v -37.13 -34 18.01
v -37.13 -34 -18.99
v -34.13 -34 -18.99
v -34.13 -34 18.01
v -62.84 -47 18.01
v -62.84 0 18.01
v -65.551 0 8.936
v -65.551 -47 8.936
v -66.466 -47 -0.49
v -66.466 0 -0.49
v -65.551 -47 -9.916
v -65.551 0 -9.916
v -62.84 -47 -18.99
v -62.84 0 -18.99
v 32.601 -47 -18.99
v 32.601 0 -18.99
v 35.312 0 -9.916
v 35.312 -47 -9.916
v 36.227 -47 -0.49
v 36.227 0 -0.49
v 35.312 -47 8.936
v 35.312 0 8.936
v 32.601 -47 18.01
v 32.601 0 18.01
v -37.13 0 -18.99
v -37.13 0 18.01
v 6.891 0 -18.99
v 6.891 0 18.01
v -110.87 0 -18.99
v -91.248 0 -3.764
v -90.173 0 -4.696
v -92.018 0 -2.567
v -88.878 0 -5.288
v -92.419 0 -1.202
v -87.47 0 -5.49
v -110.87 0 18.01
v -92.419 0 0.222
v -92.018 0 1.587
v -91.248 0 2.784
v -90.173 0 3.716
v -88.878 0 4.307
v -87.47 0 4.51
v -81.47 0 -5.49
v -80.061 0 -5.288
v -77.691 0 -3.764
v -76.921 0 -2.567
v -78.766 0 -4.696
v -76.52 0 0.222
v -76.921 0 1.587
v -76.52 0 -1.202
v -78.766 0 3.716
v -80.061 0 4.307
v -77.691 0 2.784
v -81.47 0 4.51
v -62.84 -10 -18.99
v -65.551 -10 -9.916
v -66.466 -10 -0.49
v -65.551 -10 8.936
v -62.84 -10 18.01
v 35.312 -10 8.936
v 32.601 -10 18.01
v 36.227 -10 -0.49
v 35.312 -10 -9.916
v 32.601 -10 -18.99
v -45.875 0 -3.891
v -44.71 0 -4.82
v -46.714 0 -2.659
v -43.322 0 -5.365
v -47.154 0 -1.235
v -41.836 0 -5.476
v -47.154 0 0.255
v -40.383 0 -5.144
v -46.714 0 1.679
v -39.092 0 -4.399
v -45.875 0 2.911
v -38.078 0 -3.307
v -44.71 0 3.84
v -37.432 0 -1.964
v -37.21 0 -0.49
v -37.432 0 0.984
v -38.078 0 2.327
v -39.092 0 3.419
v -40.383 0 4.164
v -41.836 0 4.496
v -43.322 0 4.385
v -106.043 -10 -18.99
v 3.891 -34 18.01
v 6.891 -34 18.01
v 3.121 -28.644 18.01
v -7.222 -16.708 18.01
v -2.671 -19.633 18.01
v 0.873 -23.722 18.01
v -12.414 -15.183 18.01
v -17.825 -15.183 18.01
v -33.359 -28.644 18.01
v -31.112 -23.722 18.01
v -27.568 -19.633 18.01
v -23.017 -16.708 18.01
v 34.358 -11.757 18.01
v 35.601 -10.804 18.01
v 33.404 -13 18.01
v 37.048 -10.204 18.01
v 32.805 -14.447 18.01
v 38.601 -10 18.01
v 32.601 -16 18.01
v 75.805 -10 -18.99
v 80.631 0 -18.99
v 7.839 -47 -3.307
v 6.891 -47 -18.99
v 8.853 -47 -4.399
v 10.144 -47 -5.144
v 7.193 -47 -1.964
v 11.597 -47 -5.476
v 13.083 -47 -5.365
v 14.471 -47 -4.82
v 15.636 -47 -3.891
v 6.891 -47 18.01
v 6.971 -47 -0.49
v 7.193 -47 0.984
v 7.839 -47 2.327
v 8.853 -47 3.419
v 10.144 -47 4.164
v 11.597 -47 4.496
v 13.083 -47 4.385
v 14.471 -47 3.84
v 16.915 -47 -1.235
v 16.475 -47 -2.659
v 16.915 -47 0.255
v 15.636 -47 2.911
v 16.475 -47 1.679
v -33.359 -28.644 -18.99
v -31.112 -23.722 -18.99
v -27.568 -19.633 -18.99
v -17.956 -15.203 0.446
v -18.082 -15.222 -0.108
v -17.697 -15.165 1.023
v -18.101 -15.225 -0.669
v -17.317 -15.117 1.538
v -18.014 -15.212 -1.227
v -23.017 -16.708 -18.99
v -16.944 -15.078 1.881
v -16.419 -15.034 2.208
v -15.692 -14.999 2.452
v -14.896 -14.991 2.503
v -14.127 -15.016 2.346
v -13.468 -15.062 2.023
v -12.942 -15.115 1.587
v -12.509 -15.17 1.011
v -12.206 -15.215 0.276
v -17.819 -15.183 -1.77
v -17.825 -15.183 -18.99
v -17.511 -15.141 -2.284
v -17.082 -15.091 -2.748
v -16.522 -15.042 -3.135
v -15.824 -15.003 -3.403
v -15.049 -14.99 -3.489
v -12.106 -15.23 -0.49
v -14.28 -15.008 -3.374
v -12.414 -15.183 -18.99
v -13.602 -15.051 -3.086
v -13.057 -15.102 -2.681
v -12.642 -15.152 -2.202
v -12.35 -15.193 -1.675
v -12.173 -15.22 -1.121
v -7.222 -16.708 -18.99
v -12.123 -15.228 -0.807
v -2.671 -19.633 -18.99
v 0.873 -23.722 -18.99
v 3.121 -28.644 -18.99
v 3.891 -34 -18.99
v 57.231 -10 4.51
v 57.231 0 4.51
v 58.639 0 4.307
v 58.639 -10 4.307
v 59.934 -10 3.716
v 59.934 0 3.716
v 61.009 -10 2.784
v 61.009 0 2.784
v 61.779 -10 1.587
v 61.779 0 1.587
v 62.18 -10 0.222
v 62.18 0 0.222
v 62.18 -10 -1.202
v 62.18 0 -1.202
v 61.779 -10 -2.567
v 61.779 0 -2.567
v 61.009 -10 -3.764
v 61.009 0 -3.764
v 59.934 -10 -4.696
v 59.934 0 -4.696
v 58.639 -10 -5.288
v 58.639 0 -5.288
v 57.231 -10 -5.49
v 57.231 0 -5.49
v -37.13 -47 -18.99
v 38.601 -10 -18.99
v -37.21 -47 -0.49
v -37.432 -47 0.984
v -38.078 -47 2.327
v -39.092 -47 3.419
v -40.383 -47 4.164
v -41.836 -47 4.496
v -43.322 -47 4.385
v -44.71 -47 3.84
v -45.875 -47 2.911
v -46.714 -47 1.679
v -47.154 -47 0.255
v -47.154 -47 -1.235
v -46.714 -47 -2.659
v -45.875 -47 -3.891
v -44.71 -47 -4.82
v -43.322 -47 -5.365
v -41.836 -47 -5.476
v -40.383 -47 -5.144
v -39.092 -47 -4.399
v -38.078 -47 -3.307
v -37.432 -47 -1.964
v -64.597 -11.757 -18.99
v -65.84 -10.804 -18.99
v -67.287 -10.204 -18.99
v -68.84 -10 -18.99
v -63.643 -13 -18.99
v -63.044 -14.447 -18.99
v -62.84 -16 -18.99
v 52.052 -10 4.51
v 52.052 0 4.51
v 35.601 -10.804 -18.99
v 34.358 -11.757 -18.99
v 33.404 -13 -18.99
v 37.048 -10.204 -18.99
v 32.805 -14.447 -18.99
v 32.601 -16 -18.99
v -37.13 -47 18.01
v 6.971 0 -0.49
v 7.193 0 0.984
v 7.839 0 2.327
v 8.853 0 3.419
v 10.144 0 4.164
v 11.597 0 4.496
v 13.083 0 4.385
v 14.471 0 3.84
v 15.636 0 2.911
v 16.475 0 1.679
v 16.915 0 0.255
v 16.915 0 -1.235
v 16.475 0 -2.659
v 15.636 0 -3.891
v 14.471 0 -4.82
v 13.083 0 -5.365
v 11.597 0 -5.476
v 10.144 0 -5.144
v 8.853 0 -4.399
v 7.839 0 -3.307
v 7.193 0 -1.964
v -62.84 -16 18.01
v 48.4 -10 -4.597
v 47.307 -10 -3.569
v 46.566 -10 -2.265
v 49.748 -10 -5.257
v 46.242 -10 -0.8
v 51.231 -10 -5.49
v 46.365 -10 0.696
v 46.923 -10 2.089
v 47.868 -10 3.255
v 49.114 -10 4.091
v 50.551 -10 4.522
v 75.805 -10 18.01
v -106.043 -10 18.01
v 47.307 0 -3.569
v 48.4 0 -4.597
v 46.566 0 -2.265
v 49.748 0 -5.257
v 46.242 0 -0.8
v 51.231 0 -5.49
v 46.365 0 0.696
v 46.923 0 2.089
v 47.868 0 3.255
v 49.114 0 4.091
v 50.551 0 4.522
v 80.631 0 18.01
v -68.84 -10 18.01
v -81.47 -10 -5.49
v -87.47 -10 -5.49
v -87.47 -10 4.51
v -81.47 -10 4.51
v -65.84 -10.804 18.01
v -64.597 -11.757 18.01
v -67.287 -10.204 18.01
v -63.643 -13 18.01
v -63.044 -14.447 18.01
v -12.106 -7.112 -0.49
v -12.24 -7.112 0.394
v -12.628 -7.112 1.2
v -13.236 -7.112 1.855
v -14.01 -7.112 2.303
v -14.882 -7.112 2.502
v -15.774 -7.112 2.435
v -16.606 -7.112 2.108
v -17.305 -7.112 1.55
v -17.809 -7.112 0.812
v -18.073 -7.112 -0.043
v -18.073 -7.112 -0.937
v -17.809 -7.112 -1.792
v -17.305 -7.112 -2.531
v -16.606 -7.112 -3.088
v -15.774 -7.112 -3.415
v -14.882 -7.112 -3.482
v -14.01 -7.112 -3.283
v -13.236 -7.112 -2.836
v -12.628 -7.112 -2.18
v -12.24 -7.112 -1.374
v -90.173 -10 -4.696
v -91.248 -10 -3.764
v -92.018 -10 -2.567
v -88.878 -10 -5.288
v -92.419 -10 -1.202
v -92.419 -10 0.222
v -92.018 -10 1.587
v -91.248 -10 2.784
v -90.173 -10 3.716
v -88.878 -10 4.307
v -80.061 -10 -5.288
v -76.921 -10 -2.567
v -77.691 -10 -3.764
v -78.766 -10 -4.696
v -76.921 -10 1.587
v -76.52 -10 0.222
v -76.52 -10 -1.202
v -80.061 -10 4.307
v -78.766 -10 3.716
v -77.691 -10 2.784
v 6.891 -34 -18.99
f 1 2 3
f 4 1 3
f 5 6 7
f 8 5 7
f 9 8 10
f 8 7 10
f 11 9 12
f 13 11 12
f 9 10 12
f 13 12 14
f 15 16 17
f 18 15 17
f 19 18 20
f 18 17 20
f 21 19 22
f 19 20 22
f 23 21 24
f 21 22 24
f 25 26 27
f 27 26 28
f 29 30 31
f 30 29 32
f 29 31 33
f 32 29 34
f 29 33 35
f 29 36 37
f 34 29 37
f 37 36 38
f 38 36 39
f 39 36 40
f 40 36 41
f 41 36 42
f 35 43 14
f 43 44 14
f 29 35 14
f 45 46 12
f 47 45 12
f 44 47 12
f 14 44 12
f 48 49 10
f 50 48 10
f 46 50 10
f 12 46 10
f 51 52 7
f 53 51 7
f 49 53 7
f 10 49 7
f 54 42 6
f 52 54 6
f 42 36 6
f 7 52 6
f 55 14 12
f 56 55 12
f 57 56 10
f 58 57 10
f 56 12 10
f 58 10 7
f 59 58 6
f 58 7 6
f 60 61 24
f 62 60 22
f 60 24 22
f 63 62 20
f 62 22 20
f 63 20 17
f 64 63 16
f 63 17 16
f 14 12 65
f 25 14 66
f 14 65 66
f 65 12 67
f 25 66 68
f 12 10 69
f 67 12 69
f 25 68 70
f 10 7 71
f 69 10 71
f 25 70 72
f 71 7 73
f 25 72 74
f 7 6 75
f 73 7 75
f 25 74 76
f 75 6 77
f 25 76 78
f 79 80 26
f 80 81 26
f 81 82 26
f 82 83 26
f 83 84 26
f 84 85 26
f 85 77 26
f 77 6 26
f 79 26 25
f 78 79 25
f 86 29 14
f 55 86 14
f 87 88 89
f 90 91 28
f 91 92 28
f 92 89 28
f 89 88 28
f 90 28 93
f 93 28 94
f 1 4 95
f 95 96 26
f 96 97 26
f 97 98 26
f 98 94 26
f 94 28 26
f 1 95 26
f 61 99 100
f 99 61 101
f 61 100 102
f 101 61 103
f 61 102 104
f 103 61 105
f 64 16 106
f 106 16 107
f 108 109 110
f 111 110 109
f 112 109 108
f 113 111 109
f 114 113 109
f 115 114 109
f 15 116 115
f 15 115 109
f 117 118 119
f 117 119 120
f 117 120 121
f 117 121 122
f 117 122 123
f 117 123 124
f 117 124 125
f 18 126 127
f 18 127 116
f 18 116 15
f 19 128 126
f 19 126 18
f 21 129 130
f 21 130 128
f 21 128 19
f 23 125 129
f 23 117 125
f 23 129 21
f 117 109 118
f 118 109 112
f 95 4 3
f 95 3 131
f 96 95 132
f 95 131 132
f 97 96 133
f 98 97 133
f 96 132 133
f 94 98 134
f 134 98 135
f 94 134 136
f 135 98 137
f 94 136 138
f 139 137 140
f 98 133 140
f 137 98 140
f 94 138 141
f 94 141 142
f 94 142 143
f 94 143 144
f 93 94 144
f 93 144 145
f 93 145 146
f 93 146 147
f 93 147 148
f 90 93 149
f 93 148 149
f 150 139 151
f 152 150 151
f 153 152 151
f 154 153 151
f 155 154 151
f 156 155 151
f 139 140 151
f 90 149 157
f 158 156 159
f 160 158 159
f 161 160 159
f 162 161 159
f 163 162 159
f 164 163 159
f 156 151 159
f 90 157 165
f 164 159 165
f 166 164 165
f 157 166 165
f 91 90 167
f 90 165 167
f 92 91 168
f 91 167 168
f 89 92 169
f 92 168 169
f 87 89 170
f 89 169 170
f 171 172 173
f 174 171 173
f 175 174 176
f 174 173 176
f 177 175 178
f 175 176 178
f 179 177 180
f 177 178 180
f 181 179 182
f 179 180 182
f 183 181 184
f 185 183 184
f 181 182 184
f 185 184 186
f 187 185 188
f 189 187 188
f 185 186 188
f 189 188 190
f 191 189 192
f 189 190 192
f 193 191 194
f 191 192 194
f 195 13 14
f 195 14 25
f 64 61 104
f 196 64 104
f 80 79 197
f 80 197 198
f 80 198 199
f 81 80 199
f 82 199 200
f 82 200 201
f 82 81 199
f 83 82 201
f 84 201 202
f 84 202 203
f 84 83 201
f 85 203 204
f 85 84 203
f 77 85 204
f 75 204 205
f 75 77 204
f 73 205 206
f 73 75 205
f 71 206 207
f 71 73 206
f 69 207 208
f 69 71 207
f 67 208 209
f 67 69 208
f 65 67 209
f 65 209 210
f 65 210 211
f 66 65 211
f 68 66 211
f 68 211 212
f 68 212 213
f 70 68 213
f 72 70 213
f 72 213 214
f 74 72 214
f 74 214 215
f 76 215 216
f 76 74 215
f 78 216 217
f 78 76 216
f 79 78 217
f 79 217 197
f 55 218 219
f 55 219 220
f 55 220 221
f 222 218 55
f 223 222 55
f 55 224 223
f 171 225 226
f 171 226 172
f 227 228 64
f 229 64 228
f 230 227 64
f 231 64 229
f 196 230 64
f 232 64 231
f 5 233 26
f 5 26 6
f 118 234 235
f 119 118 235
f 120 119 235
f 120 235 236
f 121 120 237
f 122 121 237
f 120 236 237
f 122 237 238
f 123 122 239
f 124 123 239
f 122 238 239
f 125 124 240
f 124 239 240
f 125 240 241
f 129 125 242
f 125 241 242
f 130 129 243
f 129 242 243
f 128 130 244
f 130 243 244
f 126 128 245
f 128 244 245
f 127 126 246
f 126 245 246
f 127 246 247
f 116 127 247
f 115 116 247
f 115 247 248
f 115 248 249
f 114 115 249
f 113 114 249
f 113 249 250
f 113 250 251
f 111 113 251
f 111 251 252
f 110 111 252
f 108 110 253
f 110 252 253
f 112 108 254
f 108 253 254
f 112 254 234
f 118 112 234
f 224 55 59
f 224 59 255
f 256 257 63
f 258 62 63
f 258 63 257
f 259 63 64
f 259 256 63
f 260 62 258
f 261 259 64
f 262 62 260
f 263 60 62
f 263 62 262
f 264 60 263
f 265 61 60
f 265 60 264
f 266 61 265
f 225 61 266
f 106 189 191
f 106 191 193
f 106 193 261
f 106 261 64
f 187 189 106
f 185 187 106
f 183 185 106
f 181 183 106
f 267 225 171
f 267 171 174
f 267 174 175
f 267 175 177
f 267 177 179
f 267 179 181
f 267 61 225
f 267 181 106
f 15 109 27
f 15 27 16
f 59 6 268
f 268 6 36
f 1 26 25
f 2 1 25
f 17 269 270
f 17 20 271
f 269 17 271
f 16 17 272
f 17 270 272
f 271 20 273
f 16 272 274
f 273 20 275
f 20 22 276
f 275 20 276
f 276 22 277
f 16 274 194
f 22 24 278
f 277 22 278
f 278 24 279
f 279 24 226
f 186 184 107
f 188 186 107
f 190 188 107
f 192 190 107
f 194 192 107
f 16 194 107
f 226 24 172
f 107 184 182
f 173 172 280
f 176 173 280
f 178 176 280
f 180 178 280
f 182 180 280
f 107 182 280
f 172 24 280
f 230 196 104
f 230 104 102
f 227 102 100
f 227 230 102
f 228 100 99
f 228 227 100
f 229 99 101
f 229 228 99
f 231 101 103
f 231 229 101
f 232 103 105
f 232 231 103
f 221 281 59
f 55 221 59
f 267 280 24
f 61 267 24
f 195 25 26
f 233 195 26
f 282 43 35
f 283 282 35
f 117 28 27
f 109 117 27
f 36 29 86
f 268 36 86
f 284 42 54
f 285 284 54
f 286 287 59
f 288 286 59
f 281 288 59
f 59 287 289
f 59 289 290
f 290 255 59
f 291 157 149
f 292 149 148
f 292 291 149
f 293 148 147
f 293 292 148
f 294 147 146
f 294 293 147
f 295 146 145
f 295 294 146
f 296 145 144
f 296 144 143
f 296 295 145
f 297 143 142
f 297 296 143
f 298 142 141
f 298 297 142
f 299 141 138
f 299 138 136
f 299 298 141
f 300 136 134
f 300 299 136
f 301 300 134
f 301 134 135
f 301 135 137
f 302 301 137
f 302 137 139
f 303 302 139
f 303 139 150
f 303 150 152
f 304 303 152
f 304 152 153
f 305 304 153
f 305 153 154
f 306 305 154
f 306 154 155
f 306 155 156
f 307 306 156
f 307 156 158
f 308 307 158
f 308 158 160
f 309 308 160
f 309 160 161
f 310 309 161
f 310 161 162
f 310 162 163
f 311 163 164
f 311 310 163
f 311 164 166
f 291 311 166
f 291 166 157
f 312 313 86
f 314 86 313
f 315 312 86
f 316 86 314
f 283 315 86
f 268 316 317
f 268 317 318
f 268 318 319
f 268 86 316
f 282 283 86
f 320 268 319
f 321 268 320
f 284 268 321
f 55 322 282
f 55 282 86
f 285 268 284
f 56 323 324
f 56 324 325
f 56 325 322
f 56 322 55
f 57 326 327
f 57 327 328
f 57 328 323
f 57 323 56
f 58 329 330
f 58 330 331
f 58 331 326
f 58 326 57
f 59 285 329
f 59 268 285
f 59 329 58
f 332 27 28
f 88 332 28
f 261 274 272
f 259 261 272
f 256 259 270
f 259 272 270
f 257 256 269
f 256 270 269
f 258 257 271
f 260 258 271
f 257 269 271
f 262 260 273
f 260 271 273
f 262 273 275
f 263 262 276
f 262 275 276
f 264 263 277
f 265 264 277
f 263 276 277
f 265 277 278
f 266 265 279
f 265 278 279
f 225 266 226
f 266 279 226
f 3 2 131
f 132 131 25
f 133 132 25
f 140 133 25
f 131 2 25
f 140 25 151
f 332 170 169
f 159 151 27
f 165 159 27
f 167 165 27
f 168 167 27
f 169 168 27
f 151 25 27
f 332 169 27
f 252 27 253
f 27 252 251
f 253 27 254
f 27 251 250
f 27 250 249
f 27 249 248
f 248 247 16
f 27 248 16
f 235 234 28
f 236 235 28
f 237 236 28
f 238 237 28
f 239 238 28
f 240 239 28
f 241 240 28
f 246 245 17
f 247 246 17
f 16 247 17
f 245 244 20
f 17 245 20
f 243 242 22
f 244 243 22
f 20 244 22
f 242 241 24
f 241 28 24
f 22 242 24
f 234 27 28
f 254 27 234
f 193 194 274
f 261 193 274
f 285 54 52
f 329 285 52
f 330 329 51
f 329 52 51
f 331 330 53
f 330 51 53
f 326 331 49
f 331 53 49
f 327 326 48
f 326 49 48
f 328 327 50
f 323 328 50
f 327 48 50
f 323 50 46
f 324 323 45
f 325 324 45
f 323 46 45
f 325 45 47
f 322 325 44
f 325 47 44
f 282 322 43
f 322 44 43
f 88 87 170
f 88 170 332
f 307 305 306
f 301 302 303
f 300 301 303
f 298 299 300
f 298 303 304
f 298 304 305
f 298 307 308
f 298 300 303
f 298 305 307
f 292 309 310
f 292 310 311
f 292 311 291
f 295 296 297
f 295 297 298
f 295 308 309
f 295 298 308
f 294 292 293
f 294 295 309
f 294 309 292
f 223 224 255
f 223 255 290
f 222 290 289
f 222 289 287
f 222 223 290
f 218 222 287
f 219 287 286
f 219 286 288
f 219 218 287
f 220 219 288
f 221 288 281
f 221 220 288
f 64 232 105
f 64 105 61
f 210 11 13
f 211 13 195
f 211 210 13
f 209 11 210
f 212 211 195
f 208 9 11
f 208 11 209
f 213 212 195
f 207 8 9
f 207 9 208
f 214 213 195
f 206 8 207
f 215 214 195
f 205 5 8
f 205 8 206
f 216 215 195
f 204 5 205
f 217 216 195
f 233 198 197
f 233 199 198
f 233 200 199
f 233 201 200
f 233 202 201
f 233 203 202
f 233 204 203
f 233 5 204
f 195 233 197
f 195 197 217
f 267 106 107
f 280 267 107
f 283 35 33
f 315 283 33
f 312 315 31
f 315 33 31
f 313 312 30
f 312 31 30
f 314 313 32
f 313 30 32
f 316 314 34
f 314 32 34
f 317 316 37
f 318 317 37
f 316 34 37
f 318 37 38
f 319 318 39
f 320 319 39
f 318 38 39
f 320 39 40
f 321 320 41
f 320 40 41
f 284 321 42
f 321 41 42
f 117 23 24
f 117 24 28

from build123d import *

# Parameters (mm, degrees)
F0_W      = 11.4
F0_H      = 37
F1_DEPTH  = 10
F0_R      = 5
F2_DEPTH  = 47
F0_W_2    = 38
F0_R_2    = 3
F3_DEPTH  = 34
F5_DEPTH  = 127
F7_DEPTH  = 101.6
F9_DEPTH  = 101.6
F11_DEPTH = 37
F13_DEPTH = 37
F14_DEPTH = 7.112


with BuildPart() as f1:
    # F0 (on Front) → F1 (new body)
    with BuildSketch(Plane.XZ):
        with BuildLine():
            Line((-62.839533, 18.009954), (-99.469533, 18.009954))
            Line((-99.469533, 18.009954), (-99.469533, -18.990046))
            Line((-99.469533, -18.990046), (-62.839533, -18.990046))
            ThreePointArc((-62.839533, -18.990046), (-66.466083, -0.490046), (-62.839533, 18.009954))
        make_face()
        with BuildLine():
            ThreePointArc((-87.469533, -5.490046), (-92.469533, -0.490046), (-87.469533, 4.509954))
            Line((-87.469533, 4.509954), (-81.469533, 4.509954))
            ThreePointArc((-81.469533, 4.509954), (-76.469533, -0.490046), (-81.469533, -5.490046))
            Line((-81.469533, -5.490046), (-87.469533, -5.490046))
        make_face(mode=Mode.SUBTRACT)
        with BuildLine():
            Line((36.610467, 18.009954), (32.600617, 18.009954))
            ThreePointArc((32.600617, 18.009954), (36.227167, -0.490046), (32.600617, -18.990046))
            Line((32.600617, -18.990046), (36.610467, -18.990046))
            Line((36.610467, -18.990046), (69.230617, -18.990046))
            Line((69.230617, -18.990046), (69.230617, 18.009954))
            Line((69.230617, 18.009954), (36.610467, 18.009954))
        make_face()
        with BuildLine():
            ThreePointArc((57.230617, 4.509954), (62.230617, -0.490046), (57.230617, -5.490046))
            Line((57.230617, -5.490046), (51.230617, -5.490046))
            ThreePointArc((51.230617, -5.490046), (46.247393, -0.047209), (52.051637, 4.509954))
            Line((52.051637, 4.509954), (57.230617, 4.509954))
        make_face(mode=Mode.SUBTRACT)
        with Locations((74.930617, -0.490046)):
            Rectangle(F0_W, F0_H)
        with Locations((-105.169533, -0.490046)):
            Rectangle(F0_W, F0_H)
    extrude(amount=F1_DEPTH)

    # F6 (on face) → F7 (cut)
    with BuildSketch(Plane(origin=(0, 0, -18.990046), x_dir=(1, 0, 0), z_dir=(0, 0, -1))):
        Polygon((-110.869533, 0), (-106.042653, 10), (-110.869533, 10), align=None)
    extrude(amount=-F7_DEPTH, mode=Mode.SUBTRACT)

    # F8 (on face) → F9 (cut)
    with BuildSketch(Plane(origin=(0, 0, -18.990046), x_dir=(1, 0, 0), z_dir=(0, 0, -1))):
        Polygon((75.804617, 10), (80.630617, 0), (80.630617, 10), align=None)
    extrude(amount=-F9_DEPTH, mode=Mode.SUBTRACT)


with BuildPart() as f2:
    # F0 (on Front) → F2 (new body)
    with BuildSketch(Plane.XZ):
        with BuildLine():
            Line((-53.949533, 18.009954), (-62.839533, 18.009954))
            ThreePointArc((-62.839533, 18.009954), (-66.466083, -0.490046), (-62.839533, -18.990046))
            Line((-62.839533, -18.990046), (-53.949533, -18.990046))
            ThreePointArc((-53.949533, -18.990046), (-58.132656, -0.490046), (-53.949533, 18.009954))
        make_face()
        with BuildLine():
            Line((32.600617, 18.009954), (23.710617, 18.009954))
            ThreePointArc((23.710617, 18.009954), (27.893739, -0.490046), (23.710617, -18.990046))
            Line((23.710617, -18.990046), (32.600617, -18.990046))
            ThreePointArc((32.600617, -18.990046), (36.227167, -0.490046), (32.600617, 18.009954))
        make_face()
        with BuildLine():
            Line((-37.129533, 18.009954), (-53.949533, 18.009954))
            ThreePointArc((-53.949533, 18.009954), (-58.132656, -0.490046), (-53.949533, -18.990046))
            Line((-53.949533, -18.990046), (-37.129533, -18.990046))
            Line((-37.129533, -18.990046), (-37.129533, -0.490046))
            Line((-37.129533, -0.490046), (-37.129533, 18.009954))
        make_face()
        with Locations((-42.209533, -0.490046)):
            Circle(F0_R, mode=Mode.SUBTRACT)
        with BuildLine():
            Line((23.710617, 18.009954), (6.890617, 18.009954))
            Line((6.890617, 18.009954), (6.890617, -0.490046))
            Line((6.890617, -0.490046), (6.890617, -18.990046))
            Line((6.890617, -18.990046), (23.710617, -18.990046))
            ThreePointArc((23.710617, -18.990046), (27.893739, -0.490046), (23.710617, 18.009954))
        make_face()
        with BuildLine():
            ThreePointArc((16.970617, -0.490046), (11.970617, -5.490046), (6.970617, -0.490046))
            ThreePointArc((6.970617, -0.490046), (11.970617, 4.509954), (16.970617, -0.490046))
        make_face(mode=Mode.SUBTRACT)
    extrude(amount=F2_DEPTH)


with BuildPart() as f3:
    # F0 (on Front) → F3 (new body)
    with BuildSketch(Plane.XZ):
        Polygon((-34.129533, 18.009954), (-37.129533, 18.009954), (-37.129533, -0.490046), (-37.129533, -18.990046), (-34.129533, -18.990046), align=None)
        Polygon((6.890617, 18.009954), (3.870467, 18.009954), (3.870467, -18.990046), (6.890617, -18.990046), (6.890617, -0.490046), align=None)
        with Locations((-15.129533, -0.490046)):
            Rectangle(F0_W_2, F0_H)
        with Locations((-15.106261, -0.490046)):
            Circle(F0_R_2, mode=Mode.SUBTRACT)
    extrude(amount=F3_DEPTH)

    # F4 (on face) → F5 (cut)
    with BuildSketch(Plane(origin=(0, 0, -18.990046), x_dir=(1, 0, 0), z_dir=(0, 0, -1))):
        with BuildLine():
            ThreePointArc((-34.129533, 34), (-15.119458, 14.989925), (3.890617, 34))
            Line((3.890617, 34), (-34.129533, 34))
        make_face()
    extrude(amount=-F5_DEPTH, mode=Mode.SUBTRACT)

    # F0 (on Front) → F14 (join)
    with BuildSketch(Plane.XZ):
        with Locations((-15.106261, -0.490046)):
            Circle(F0_R_2)
    extrude(amount=F14_DEPTH)


with BuildPart() as f11:
    # F10 (on face) → F11 (new body)
    with BuildSketch(Plane(origin=(0, 0, -18.990046), x_dir=(1, 0, 0), z_dir=(0, 0, -1))):
        with BuildLine():
            Line((32.600617, 10), (38.600617, 10))
            ThreePointArc((38.600617, 10), (34.357977, 11.757359), (32.600617, 16))
            Line((32.600617, 16), (32.600617, 10))
        make_face()
    extrude(amount=-F11_DEPTH)


with BuildPart() as f13:
    # F12 (on face) → F13 (new body)
    with BuildSketch(Plane(origin=(0, 0, -18.990046), x_dir=(1, 0, 0), z_dir=(0, 0, -1))):
        with BuildLine():
            ThreePointArc((-62.839533, 16), (-64.596893, 11.757359), (-68.839533, 10))
            Line((-68.839533, 10), (-62.839533, 10))
            Line((-62.839533, 10), (-62.839533, 16))
        make_face()
    extrude(amount=-F13_DEPTH)


solid = Compound([f1.part, f2.part, f3.part, f11.part, f13.part])
